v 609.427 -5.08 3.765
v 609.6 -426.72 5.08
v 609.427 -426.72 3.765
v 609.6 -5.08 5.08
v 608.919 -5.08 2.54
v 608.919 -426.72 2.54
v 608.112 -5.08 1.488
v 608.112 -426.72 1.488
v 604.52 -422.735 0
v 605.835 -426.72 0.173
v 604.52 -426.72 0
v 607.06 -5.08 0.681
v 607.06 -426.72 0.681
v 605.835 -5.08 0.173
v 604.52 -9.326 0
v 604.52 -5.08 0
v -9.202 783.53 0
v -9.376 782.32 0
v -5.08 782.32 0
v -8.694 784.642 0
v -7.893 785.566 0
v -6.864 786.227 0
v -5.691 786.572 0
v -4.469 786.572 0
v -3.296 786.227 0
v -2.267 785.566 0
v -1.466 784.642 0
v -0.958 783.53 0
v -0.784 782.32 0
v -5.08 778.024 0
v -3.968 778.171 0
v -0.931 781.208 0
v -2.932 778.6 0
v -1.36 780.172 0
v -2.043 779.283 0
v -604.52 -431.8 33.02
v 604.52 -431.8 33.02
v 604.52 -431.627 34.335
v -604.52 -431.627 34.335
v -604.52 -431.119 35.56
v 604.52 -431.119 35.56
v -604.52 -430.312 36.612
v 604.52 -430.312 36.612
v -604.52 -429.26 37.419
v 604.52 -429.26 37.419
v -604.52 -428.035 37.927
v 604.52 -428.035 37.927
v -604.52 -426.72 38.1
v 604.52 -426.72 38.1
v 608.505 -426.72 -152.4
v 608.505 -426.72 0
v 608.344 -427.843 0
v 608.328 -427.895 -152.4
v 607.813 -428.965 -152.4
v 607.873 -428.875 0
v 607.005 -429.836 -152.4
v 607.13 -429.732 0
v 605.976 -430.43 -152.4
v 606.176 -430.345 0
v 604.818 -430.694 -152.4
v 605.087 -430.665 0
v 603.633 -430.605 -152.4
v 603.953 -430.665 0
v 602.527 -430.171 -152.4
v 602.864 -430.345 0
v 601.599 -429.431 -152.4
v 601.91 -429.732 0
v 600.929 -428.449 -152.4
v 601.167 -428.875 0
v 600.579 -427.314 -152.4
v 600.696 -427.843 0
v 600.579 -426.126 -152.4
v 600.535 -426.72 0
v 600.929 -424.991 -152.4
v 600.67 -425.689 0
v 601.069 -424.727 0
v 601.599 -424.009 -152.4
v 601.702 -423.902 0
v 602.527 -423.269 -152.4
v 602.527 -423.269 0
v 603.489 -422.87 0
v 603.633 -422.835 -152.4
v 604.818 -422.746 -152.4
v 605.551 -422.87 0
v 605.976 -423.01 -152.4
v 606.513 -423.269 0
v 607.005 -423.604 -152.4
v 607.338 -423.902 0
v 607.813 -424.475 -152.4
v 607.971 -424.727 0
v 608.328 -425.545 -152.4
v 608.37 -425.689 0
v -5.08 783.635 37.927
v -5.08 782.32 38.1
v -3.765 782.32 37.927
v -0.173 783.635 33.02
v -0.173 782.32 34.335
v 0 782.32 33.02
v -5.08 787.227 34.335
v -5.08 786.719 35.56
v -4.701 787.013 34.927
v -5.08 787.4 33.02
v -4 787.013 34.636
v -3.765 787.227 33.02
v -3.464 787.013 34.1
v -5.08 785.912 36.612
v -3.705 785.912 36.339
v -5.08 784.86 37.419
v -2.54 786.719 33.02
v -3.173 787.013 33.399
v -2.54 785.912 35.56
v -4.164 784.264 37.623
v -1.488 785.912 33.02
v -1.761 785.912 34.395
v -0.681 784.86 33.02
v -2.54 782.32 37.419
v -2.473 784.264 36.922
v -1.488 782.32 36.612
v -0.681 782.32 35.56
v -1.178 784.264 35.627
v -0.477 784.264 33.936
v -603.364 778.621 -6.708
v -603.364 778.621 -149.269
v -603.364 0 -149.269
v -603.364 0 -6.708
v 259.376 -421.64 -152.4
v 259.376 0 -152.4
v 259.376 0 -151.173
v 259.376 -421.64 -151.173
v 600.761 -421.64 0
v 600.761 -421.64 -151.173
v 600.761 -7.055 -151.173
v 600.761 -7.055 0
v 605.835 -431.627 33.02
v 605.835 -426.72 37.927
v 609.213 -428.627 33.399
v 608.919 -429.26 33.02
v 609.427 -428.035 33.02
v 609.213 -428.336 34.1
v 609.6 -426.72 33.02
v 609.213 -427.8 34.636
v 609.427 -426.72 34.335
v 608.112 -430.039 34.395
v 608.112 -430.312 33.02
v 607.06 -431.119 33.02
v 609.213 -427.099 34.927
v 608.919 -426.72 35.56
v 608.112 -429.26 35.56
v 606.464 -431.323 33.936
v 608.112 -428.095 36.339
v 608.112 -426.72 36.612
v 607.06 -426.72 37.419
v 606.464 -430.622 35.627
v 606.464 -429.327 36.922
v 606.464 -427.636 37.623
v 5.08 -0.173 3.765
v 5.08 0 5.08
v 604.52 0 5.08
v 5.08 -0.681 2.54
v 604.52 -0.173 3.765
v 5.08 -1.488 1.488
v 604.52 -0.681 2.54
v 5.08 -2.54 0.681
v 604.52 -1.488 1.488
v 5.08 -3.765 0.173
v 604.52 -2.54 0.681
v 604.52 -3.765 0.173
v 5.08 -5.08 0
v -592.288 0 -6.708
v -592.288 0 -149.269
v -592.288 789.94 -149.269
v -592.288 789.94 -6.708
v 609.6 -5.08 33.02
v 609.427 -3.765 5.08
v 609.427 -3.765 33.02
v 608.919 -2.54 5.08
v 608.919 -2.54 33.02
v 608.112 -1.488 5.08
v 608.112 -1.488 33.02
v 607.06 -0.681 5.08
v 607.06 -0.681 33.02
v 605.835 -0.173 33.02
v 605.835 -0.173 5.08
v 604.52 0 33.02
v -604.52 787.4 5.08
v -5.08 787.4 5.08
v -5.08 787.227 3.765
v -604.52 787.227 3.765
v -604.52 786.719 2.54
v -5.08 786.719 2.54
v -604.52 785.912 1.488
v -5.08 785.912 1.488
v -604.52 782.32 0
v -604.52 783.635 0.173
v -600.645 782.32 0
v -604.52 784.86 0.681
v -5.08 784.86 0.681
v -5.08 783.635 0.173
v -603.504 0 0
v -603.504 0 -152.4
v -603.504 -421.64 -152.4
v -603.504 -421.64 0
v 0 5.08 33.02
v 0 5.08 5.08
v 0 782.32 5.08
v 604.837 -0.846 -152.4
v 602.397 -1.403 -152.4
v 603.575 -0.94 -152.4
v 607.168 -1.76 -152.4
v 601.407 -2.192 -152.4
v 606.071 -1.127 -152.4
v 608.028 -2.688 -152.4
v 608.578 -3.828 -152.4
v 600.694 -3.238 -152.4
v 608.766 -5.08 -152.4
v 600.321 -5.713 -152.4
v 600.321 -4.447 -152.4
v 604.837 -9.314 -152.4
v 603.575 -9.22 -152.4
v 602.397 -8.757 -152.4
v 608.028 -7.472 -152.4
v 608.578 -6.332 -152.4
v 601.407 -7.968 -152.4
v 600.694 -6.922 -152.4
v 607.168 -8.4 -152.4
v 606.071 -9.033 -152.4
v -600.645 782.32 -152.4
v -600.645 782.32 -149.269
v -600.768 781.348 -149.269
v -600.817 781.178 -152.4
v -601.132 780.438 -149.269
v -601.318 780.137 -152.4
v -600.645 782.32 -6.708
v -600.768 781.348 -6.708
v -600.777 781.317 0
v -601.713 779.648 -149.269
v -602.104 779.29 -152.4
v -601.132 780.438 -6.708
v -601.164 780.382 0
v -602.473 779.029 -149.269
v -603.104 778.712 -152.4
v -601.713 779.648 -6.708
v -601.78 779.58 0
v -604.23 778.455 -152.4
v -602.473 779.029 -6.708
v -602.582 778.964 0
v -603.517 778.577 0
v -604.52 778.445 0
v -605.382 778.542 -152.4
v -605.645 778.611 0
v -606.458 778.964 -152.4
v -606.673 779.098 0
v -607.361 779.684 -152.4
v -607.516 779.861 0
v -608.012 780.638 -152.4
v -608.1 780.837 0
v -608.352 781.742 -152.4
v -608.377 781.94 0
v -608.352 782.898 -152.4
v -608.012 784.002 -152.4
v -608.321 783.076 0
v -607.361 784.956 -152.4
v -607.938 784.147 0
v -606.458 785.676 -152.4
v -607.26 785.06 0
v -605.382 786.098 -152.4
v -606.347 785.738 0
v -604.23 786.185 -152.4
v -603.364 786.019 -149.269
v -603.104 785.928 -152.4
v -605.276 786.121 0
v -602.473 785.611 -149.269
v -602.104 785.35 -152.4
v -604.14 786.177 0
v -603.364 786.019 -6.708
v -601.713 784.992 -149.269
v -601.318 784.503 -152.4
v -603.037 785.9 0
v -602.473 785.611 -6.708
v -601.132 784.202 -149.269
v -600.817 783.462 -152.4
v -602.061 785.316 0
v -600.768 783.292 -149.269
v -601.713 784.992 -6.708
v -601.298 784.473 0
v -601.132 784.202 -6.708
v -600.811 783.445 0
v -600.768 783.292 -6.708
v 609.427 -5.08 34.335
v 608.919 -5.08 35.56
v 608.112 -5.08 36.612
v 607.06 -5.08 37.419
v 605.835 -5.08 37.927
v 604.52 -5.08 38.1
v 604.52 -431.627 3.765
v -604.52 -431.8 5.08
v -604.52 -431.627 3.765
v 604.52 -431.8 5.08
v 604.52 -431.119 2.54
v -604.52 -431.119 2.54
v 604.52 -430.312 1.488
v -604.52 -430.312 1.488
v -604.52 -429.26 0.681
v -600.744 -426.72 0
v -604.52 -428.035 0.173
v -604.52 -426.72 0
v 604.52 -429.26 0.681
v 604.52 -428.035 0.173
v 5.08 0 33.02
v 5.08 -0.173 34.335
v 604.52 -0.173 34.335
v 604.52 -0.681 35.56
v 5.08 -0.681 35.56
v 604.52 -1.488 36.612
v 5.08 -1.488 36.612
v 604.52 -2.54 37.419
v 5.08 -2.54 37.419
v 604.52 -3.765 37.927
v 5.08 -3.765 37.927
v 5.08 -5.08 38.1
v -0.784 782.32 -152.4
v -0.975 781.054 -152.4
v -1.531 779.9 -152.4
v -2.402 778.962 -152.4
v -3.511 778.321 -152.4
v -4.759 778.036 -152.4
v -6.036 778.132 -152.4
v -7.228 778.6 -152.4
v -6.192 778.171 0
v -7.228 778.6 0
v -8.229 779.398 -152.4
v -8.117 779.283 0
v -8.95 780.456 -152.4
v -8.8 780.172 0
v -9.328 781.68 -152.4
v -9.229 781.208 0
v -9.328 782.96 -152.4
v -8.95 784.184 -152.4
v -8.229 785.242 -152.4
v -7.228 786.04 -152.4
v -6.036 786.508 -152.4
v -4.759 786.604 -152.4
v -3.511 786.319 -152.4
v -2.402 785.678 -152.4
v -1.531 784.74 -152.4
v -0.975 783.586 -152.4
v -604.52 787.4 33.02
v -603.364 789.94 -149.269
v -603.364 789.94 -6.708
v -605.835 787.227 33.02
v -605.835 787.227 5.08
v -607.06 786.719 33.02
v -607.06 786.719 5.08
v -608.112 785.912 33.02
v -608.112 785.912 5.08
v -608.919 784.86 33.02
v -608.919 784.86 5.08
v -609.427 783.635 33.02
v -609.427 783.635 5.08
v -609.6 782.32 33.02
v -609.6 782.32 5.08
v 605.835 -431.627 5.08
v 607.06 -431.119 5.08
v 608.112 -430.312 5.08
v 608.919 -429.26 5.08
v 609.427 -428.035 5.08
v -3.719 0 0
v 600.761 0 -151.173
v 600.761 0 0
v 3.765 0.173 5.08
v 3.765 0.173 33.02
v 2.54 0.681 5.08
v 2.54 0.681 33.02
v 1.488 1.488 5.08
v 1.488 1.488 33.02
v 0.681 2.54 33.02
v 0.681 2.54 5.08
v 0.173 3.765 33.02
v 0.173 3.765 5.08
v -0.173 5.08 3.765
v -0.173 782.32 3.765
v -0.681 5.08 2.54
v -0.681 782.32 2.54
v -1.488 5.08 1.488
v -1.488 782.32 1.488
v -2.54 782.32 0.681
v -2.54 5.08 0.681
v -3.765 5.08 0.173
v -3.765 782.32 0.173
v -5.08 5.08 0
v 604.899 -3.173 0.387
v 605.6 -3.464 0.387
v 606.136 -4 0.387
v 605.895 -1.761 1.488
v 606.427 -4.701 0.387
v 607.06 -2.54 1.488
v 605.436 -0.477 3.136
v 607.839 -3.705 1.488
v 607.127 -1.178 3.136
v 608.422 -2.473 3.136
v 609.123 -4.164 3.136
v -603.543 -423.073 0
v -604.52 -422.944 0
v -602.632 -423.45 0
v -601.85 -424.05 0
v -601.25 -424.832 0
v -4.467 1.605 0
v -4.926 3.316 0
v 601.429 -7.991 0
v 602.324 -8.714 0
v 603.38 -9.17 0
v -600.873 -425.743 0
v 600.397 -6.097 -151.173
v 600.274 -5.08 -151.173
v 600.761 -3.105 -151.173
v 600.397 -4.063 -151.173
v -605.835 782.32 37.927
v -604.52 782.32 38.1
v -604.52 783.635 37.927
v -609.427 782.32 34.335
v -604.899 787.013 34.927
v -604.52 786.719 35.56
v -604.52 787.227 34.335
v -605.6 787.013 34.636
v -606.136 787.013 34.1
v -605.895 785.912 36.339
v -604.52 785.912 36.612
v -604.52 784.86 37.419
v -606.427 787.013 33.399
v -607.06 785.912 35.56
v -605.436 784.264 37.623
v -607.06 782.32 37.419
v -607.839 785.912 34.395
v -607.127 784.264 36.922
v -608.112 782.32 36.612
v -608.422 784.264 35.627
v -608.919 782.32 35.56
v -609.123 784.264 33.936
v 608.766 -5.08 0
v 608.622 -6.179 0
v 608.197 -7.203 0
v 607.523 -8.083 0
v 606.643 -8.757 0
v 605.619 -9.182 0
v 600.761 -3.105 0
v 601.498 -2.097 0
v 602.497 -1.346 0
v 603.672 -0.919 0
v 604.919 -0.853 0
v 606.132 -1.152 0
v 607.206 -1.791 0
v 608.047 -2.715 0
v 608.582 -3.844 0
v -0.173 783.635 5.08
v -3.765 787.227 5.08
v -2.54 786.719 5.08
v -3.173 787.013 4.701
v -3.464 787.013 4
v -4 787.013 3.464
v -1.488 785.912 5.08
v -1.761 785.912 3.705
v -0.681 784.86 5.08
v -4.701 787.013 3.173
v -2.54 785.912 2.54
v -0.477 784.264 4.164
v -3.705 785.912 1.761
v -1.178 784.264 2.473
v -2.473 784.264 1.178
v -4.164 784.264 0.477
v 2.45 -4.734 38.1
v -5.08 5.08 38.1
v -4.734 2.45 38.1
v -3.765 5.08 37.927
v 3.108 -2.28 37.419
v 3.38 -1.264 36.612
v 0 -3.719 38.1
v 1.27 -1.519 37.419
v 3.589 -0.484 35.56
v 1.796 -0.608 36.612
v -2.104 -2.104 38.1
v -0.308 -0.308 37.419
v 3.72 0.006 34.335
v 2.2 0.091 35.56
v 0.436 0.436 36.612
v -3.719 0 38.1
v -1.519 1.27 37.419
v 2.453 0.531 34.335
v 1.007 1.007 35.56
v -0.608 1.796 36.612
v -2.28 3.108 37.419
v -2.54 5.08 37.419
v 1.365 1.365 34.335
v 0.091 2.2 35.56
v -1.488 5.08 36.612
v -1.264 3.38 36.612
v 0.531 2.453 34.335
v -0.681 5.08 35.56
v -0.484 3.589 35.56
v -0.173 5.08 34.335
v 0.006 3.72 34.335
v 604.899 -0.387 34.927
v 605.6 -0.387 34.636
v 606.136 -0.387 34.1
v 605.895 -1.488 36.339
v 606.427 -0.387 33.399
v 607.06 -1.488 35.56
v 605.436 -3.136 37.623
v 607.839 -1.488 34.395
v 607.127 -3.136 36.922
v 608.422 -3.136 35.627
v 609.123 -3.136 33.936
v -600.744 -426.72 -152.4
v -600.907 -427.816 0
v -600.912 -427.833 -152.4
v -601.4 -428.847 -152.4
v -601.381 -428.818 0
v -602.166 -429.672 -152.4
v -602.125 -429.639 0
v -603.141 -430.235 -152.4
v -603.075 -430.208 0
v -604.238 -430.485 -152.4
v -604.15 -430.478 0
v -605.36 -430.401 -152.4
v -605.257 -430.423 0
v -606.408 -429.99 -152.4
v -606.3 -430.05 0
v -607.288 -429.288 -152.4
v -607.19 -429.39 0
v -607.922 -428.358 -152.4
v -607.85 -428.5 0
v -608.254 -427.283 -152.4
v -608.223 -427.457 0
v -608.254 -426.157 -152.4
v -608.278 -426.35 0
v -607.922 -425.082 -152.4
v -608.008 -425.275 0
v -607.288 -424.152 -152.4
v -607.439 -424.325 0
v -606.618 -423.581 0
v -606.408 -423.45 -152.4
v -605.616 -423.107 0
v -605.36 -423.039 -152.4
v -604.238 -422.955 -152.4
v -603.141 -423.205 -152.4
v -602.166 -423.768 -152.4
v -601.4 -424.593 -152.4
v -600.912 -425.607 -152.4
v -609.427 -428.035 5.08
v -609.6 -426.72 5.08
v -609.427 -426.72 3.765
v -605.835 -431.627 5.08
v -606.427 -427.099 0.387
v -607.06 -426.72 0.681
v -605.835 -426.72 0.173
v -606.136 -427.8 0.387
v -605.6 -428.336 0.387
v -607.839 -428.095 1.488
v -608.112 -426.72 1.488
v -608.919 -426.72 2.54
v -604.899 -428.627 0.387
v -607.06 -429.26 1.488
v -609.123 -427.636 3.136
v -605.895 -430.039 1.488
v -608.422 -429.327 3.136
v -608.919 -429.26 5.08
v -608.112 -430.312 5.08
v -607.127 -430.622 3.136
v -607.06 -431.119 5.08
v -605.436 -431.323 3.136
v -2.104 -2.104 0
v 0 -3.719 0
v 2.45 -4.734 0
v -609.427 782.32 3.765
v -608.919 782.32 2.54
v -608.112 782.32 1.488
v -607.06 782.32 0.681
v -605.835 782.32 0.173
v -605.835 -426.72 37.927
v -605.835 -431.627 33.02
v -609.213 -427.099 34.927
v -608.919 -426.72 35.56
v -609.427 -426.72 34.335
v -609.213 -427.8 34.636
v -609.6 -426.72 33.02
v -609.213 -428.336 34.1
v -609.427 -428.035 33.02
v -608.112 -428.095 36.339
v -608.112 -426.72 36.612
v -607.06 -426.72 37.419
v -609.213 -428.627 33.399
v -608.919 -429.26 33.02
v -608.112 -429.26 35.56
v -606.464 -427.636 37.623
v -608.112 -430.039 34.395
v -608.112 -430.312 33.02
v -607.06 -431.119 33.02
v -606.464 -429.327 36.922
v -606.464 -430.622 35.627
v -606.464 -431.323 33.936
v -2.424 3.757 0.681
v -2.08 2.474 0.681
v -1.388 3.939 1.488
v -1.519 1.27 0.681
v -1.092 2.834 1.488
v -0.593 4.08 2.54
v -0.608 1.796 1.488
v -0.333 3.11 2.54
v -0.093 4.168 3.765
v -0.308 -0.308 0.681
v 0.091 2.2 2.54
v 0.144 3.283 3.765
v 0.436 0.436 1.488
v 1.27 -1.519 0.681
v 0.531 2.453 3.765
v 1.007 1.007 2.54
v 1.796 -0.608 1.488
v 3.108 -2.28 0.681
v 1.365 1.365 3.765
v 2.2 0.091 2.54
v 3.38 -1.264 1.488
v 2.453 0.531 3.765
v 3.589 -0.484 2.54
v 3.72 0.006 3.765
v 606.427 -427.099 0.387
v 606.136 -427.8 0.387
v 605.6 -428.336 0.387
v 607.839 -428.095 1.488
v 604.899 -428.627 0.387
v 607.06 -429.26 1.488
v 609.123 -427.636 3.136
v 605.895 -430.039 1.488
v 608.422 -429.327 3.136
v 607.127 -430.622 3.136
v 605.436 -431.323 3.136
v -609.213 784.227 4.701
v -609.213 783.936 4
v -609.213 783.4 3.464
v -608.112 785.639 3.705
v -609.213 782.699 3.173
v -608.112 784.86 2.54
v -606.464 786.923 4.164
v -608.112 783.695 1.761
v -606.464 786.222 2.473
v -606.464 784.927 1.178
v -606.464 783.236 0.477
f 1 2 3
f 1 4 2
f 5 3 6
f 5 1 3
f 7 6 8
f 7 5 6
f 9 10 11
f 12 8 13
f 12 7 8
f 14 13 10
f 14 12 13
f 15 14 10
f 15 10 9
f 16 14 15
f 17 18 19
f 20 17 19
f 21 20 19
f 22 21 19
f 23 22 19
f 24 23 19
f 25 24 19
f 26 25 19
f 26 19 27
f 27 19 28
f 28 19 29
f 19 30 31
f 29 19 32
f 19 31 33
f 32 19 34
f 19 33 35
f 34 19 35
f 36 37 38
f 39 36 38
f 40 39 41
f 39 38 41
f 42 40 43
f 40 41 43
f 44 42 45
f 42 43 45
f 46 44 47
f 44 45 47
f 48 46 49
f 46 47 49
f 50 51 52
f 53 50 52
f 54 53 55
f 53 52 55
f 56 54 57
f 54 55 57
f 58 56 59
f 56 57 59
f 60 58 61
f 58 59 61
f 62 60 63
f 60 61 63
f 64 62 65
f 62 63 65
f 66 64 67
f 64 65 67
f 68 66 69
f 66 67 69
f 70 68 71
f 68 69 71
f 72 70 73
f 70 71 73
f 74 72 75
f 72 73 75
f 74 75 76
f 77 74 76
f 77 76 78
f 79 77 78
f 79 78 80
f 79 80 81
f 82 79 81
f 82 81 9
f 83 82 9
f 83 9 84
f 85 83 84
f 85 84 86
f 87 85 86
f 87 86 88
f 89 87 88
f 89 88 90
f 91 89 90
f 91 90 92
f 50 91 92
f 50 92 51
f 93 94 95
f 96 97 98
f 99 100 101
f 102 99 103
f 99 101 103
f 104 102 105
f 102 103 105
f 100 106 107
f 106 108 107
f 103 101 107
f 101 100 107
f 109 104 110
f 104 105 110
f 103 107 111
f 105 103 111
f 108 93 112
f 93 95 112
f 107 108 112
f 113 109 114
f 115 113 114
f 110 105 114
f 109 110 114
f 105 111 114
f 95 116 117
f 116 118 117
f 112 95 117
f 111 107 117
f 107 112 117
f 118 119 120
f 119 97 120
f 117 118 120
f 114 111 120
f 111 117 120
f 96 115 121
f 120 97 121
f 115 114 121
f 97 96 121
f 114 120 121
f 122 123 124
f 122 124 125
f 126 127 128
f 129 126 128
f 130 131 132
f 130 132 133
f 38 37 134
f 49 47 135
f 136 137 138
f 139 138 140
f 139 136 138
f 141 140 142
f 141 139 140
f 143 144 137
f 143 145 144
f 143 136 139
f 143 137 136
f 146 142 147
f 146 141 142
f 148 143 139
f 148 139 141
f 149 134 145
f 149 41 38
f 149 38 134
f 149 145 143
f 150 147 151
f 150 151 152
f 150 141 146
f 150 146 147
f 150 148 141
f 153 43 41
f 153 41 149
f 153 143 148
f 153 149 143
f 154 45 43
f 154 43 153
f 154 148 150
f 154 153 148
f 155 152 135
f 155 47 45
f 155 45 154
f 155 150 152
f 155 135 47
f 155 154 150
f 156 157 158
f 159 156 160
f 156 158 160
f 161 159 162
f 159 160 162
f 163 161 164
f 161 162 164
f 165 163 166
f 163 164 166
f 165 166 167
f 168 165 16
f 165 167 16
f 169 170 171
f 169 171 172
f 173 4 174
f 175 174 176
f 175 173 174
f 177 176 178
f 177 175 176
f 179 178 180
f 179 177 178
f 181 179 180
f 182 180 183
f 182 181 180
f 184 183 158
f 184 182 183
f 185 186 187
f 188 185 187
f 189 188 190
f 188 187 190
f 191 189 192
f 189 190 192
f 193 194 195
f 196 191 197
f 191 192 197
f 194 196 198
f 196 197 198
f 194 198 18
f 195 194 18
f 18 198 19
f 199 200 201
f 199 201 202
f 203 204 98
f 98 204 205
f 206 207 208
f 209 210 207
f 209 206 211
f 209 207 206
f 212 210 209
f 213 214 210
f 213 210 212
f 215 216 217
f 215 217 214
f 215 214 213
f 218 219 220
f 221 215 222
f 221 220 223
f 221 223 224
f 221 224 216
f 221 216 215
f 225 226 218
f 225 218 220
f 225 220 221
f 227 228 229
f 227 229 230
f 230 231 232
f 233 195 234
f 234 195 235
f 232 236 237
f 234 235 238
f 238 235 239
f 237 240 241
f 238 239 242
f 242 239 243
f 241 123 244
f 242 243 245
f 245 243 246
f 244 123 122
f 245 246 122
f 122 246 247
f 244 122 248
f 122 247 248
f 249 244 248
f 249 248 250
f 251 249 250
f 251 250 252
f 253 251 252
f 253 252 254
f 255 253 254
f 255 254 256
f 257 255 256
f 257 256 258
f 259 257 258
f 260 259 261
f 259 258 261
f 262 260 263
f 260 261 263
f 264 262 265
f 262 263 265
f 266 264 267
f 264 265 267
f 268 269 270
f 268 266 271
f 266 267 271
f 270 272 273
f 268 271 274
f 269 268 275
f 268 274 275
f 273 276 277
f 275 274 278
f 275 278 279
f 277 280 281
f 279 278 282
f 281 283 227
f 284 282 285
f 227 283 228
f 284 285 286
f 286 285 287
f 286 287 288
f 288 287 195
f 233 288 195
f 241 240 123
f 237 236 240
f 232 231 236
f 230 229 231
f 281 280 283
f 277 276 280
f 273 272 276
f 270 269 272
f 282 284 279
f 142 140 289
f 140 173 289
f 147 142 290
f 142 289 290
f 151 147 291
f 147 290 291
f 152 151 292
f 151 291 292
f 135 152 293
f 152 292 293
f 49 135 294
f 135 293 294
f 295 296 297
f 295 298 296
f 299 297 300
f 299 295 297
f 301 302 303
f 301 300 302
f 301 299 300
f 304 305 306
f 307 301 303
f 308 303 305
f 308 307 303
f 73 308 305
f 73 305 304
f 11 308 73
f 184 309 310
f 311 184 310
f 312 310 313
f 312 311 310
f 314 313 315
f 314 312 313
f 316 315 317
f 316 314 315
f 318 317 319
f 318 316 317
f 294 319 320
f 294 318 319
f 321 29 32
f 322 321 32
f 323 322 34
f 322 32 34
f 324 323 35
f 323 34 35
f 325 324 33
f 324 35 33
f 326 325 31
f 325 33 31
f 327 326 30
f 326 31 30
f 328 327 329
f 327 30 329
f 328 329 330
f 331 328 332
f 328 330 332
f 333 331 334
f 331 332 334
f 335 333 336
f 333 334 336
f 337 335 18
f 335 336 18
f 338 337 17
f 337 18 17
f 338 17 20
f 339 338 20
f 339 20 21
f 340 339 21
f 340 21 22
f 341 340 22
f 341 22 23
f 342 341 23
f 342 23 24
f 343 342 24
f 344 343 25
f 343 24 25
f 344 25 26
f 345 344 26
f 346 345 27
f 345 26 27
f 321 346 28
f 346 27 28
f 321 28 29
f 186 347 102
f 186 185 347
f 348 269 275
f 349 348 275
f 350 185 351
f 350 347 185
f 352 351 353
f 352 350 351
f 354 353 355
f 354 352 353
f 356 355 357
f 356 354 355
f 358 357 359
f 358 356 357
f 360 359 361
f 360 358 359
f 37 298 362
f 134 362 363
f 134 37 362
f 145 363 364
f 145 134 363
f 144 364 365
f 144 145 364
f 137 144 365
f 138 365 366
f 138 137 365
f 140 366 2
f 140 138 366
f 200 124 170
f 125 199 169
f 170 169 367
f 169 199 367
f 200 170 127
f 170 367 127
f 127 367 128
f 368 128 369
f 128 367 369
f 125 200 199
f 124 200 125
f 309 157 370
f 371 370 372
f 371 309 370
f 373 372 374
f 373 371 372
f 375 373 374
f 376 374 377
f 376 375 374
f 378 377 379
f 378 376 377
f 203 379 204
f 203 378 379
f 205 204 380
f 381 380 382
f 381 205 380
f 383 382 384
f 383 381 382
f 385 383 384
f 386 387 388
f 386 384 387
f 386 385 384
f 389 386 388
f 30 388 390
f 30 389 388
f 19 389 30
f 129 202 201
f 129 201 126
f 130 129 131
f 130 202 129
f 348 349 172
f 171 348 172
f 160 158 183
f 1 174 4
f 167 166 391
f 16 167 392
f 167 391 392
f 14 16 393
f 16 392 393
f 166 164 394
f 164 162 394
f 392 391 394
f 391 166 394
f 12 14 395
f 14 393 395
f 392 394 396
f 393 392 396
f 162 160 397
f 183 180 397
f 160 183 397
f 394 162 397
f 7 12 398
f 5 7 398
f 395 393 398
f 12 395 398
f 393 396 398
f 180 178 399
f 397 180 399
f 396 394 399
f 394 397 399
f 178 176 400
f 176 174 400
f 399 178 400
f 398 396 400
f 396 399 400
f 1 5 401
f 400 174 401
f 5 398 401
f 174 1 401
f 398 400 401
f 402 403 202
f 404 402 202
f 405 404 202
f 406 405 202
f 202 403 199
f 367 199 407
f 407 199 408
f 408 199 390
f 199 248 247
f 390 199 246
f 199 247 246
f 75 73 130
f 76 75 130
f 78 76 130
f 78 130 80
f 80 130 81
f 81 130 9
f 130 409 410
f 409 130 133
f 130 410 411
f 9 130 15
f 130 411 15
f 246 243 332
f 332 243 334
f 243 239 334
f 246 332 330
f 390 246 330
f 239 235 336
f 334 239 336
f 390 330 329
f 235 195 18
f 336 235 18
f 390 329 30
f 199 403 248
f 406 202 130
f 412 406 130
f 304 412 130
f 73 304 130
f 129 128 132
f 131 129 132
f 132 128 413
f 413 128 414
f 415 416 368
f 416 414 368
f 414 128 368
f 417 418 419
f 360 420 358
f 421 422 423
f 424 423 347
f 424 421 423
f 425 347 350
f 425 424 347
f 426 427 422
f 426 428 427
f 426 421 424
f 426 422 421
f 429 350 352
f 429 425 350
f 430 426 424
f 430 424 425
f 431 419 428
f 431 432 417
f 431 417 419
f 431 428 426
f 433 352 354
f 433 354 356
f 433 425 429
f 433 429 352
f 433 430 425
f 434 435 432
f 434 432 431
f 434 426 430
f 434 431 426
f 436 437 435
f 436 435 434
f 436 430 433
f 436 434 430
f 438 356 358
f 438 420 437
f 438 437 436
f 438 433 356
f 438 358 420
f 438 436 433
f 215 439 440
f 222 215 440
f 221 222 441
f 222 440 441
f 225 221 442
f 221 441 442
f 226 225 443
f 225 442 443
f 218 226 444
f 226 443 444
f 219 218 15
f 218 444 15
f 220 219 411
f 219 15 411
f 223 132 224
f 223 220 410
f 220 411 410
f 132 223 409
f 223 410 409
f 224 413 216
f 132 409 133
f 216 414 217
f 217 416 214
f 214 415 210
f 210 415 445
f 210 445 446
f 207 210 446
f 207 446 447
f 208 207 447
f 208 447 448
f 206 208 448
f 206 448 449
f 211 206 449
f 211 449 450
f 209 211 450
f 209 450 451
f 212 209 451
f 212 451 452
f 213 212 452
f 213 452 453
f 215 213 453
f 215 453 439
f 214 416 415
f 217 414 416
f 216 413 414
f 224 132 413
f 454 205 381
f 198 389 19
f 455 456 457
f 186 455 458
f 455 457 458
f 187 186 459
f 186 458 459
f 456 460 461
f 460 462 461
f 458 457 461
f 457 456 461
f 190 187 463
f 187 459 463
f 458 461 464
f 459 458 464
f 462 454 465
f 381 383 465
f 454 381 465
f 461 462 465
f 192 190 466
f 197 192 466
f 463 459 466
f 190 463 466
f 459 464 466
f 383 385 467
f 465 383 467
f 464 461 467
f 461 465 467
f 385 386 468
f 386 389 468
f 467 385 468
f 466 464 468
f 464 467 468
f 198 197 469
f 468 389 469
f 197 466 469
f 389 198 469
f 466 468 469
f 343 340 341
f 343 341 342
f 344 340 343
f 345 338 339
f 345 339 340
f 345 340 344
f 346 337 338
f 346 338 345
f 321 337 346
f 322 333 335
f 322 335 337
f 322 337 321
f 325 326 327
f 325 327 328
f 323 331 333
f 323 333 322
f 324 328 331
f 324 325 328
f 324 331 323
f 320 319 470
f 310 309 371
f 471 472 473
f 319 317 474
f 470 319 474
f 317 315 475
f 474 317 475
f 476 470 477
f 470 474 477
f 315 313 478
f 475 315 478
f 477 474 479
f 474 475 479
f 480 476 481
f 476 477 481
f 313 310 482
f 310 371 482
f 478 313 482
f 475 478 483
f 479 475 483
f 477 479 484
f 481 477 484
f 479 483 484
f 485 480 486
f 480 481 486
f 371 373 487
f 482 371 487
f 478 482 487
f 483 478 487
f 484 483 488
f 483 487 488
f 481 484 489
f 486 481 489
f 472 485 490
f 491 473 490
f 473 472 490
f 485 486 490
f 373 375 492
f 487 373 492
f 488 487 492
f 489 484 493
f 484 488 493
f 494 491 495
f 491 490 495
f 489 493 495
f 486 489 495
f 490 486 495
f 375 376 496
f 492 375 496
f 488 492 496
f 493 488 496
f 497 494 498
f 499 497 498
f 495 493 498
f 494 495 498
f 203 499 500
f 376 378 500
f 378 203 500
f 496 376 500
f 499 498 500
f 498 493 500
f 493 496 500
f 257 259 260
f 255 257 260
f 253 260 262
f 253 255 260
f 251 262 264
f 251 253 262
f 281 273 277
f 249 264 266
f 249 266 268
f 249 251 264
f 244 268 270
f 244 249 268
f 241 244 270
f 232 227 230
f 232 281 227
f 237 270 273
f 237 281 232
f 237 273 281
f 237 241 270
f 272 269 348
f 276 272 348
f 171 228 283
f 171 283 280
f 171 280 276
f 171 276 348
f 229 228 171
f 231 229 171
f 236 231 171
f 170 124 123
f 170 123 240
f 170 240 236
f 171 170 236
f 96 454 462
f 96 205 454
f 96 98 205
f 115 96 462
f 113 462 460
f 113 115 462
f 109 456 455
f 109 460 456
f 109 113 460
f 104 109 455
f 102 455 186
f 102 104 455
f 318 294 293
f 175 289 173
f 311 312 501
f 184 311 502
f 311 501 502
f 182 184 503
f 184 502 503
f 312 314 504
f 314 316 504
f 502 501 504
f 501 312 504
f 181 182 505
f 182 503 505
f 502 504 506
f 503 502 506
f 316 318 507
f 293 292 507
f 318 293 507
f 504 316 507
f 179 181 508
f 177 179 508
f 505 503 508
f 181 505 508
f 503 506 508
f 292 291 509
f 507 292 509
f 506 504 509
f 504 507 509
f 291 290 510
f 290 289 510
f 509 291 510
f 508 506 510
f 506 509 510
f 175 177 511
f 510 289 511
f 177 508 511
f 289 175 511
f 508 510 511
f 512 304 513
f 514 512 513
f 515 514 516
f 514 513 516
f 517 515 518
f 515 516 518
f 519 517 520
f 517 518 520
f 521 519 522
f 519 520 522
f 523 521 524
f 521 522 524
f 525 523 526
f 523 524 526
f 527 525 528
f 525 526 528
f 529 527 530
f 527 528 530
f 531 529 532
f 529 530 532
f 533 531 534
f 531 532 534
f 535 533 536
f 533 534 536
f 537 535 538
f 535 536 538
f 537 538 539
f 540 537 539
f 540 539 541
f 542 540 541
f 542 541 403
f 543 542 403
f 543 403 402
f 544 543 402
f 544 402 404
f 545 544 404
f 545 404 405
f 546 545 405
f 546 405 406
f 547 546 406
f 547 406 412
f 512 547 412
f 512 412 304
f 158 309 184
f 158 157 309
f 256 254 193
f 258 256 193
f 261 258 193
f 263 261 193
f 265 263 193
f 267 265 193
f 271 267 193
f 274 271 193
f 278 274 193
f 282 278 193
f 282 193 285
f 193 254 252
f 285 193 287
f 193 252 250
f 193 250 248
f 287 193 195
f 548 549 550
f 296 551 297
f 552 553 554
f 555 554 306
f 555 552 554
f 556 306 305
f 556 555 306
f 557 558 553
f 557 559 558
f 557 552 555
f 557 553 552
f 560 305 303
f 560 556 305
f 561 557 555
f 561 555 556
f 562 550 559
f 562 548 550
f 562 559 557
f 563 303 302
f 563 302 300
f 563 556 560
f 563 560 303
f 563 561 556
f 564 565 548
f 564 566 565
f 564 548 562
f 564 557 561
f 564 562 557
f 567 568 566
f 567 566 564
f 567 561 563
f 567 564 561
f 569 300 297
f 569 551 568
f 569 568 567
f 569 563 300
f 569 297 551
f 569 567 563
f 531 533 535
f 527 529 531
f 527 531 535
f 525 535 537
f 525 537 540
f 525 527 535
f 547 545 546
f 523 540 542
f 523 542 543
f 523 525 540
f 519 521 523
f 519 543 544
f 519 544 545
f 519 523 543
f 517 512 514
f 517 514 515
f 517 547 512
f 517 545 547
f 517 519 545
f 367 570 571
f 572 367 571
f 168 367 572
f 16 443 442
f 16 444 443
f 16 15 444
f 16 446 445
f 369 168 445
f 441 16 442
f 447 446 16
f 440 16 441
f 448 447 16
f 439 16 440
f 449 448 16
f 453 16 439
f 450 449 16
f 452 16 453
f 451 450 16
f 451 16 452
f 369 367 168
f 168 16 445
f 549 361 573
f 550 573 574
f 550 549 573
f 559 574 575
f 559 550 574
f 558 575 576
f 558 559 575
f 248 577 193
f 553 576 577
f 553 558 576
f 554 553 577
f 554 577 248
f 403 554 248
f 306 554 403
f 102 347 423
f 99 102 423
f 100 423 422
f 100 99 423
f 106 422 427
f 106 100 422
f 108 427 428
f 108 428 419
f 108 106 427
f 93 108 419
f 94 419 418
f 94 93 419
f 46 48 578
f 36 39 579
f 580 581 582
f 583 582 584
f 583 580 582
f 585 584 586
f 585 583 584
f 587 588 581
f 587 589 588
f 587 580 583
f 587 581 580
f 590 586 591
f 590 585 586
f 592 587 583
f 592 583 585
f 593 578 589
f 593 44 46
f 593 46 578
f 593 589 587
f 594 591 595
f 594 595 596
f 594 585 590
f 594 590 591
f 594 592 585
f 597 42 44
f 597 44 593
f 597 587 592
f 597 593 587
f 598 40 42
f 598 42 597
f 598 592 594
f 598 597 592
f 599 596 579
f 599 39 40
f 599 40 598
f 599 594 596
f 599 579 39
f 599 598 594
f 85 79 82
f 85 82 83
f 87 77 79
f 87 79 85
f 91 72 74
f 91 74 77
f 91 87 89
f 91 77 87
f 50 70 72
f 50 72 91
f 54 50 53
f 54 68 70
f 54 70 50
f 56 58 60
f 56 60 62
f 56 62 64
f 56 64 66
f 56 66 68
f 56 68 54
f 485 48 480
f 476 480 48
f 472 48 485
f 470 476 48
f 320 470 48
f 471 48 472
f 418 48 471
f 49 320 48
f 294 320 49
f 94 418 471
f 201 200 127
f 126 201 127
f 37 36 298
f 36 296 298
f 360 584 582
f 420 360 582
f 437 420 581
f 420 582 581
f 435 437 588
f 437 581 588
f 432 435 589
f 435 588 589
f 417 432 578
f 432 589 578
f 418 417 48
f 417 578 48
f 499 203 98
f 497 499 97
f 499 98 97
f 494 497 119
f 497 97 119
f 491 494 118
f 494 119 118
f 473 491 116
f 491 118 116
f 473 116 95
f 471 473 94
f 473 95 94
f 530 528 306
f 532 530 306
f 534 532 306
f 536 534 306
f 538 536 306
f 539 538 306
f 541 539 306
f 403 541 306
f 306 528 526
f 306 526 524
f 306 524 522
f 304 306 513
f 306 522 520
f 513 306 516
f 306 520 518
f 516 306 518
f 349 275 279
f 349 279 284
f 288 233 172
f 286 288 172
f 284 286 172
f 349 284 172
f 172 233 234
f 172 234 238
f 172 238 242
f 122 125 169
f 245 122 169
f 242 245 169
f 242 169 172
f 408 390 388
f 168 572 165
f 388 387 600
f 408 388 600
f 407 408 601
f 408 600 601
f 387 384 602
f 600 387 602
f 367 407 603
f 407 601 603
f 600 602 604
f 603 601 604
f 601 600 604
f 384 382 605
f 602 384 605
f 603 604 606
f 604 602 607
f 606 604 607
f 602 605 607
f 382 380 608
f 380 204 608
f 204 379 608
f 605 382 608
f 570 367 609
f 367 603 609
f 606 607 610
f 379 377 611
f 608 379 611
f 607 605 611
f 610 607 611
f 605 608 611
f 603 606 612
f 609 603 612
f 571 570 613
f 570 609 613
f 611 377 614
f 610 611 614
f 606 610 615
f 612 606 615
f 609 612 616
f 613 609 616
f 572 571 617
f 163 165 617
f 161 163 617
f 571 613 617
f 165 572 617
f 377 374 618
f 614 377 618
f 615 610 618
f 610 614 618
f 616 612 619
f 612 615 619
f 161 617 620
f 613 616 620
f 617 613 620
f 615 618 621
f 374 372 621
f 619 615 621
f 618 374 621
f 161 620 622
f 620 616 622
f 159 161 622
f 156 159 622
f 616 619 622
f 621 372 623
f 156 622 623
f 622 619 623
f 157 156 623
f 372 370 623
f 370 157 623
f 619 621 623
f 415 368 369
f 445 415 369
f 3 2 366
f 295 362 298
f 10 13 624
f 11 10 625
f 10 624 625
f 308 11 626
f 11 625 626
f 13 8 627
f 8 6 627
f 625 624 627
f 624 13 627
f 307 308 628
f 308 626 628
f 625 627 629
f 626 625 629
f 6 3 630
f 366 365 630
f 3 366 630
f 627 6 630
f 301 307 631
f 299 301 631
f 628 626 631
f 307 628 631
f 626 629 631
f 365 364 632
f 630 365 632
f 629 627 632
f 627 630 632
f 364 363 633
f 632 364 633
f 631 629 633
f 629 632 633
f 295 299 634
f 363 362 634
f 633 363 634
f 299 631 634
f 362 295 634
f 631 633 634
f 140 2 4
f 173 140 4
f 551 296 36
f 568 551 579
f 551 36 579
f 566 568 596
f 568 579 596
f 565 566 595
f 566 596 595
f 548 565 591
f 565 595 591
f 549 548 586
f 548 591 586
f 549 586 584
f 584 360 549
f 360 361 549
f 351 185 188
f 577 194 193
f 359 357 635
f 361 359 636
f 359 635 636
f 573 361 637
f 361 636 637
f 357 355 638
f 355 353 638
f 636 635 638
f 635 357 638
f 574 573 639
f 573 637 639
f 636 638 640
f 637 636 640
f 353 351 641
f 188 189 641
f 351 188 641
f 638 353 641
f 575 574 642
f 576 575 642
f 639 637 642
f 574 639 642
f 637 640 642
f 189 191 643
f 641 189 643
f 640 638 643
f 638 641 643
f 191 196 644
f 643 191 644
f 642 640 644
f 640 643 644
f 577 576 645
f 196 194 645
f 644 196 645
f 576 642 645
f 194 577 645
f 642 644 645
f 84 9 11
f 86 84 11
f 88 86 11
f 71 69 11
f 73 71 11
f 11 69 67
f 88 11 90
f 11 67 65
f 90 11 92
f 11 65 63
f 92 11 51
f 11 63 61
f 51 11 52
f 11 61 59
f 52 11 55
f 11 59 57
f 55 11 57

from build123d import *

# Parameters (mm, degrees)
F0_W      = 609.6
F0_H      = 431.8
F0_H_2    = 787.4
F1_DEPTH  = 38.1
F2_R      = 5.08
F3_R      = 3.875472852
F4_DEPTH  = 152.4
F5_R      = 3.7758304199
F6_DEPTH  = 152.4
F7_R      = 3.9853573506
F8_DEPTH  = 152.4
F9_R      = 4.2462881123
F10_DEPTH = 152.4
F11_R     = 4.2955728054
F12_DEPTH = 152.4
F13_W     = 600.7608175278
F13_H     = 151.1726528406
F15_DEPTH = 421.64
F14_W     = 862.8795146942
F14_H     = 152.4000018835
F16_DEPTH = 421.64
F17_W     = 11.0756754875
F17_H     = 142.5614315085
F18_DEPTH = 789.94


with BuildPart() as f1:
    # F0 (on Top) → F1 (new body)
    with BuildSketch(Plane.XY):
        with Locations((-304.8, -215.9)):
            Rectangle(F0_W, F0_H)
        with Locations((-304.8, 393.7)):
            Rectangle(F0_W, F0_H_2)
        with Locations((304.8, -215.9)):
            Rectangle(F0_W, F0_H)
    extrude(amount=F1_DEPTH)

    # F2
    f2_edges = [f1.edges().sort_by_distance(p)[0] for p in [
        (0, -431.8, 38.1),
        (609.6, -431.8, 19.05),
        (609.6, -215.9, 38.1),
        (304.8, 0, 38.1),
        (0, 393.7, 38.1),
        (-609.6, 177.8, 38.1),
        (-304.8, 787.4, 38.1),
        (0, 393.7, 0),
        (609.6, 0, 19.05),
        (304.8, 0, 0),
        (0, 0, 19.05),
        (609.6, -215.9, 0),
        (0, 787.4, 19.05),
        (-304.8, 787.4, 0),
        (-609.6, 787.4, 19.05),
        (-609.6, -431.8, 19.05),
        (-609.6, 177.8, 0),
        (0, -431.8, 0),
    ]]
    fillet(f2_edges, radius=F2_R)

    # F3 (on face) → F4 (join)
    with BuildSketch(Plane(origin=(0, 0, 0), x_dir=(1, 0, 0), z_dir=(0, 0, -1))):
        with Locations((-604.52, -782.32)):
            Circle(F3_R)
    extrude(amount=F4_DEPTH)

    # F5 (on face) → F6 (join)
    with BuildSketch(Plane(origin=(0, 0, 0), x_dir=(1, 0, 0), z_dir=(0, 0, -1))):
        with Locations((-604.52, 426.72)):
            Circle(F5_R)
    extrude(amount=F6_DEPTH)

    # F7 (on face) → F8 (join)
    with BuildSketch(Plane(origin=(0, 0, 0), x_dir=(1, 0, 0), z_dir=(0, 0, -1))):
        with Locations((604.52, 426.72)):
            Circle(F7_R)
    extrude(amount=F8_DEPTH)

    # F9 (on face) → F10 (join)
    with BuildSketch(Plane(origin=(0, 0, 0), x_dir=(1, 0, 0), z_dir=(0, 0, -1))):
        with Locations((604.52, 5.08)):
            Circle(F9_R)
    extrude(amount=F10_DEPTH)

    # F11 (on face) → F12 (join)
    with BuildSketch(Plane(origin=(0, 0, 0), x_dir=(1, 0, 0), z_dir=(0, 0, -1))):
        with Locations((-5.08, -782.32)):
            Circle(F11_R)
    extrude(amount=F12_DEPTH)

    # F13 (on Front) → F15 (join)
    with BuildSketch(Plane.XZ):
        with Locations((300.3804087639, -75.5863264203)):
            Rectangle(F13_W, F13_H)
    extrude(amount=F15_DEPTH)

    # F14 (on Front) → F16 (join)
    with BuildSketch(Plane.XZ):
        with Locations((-172.0642447472, -76.2000009418)):
            Rectangle(F14_W, F14_H)
    extrude(amount=F16_DEPTH)

    # F17 (on Front) → F18 (join)
    with BuildSketch(Plane.XZ):
        with Locations((-597.8262126446, -77.9886713717)):
            Rectangle(F17_W, F17_H)
    extrude(amount=-F18_DEPTH)


solid = f1.part
